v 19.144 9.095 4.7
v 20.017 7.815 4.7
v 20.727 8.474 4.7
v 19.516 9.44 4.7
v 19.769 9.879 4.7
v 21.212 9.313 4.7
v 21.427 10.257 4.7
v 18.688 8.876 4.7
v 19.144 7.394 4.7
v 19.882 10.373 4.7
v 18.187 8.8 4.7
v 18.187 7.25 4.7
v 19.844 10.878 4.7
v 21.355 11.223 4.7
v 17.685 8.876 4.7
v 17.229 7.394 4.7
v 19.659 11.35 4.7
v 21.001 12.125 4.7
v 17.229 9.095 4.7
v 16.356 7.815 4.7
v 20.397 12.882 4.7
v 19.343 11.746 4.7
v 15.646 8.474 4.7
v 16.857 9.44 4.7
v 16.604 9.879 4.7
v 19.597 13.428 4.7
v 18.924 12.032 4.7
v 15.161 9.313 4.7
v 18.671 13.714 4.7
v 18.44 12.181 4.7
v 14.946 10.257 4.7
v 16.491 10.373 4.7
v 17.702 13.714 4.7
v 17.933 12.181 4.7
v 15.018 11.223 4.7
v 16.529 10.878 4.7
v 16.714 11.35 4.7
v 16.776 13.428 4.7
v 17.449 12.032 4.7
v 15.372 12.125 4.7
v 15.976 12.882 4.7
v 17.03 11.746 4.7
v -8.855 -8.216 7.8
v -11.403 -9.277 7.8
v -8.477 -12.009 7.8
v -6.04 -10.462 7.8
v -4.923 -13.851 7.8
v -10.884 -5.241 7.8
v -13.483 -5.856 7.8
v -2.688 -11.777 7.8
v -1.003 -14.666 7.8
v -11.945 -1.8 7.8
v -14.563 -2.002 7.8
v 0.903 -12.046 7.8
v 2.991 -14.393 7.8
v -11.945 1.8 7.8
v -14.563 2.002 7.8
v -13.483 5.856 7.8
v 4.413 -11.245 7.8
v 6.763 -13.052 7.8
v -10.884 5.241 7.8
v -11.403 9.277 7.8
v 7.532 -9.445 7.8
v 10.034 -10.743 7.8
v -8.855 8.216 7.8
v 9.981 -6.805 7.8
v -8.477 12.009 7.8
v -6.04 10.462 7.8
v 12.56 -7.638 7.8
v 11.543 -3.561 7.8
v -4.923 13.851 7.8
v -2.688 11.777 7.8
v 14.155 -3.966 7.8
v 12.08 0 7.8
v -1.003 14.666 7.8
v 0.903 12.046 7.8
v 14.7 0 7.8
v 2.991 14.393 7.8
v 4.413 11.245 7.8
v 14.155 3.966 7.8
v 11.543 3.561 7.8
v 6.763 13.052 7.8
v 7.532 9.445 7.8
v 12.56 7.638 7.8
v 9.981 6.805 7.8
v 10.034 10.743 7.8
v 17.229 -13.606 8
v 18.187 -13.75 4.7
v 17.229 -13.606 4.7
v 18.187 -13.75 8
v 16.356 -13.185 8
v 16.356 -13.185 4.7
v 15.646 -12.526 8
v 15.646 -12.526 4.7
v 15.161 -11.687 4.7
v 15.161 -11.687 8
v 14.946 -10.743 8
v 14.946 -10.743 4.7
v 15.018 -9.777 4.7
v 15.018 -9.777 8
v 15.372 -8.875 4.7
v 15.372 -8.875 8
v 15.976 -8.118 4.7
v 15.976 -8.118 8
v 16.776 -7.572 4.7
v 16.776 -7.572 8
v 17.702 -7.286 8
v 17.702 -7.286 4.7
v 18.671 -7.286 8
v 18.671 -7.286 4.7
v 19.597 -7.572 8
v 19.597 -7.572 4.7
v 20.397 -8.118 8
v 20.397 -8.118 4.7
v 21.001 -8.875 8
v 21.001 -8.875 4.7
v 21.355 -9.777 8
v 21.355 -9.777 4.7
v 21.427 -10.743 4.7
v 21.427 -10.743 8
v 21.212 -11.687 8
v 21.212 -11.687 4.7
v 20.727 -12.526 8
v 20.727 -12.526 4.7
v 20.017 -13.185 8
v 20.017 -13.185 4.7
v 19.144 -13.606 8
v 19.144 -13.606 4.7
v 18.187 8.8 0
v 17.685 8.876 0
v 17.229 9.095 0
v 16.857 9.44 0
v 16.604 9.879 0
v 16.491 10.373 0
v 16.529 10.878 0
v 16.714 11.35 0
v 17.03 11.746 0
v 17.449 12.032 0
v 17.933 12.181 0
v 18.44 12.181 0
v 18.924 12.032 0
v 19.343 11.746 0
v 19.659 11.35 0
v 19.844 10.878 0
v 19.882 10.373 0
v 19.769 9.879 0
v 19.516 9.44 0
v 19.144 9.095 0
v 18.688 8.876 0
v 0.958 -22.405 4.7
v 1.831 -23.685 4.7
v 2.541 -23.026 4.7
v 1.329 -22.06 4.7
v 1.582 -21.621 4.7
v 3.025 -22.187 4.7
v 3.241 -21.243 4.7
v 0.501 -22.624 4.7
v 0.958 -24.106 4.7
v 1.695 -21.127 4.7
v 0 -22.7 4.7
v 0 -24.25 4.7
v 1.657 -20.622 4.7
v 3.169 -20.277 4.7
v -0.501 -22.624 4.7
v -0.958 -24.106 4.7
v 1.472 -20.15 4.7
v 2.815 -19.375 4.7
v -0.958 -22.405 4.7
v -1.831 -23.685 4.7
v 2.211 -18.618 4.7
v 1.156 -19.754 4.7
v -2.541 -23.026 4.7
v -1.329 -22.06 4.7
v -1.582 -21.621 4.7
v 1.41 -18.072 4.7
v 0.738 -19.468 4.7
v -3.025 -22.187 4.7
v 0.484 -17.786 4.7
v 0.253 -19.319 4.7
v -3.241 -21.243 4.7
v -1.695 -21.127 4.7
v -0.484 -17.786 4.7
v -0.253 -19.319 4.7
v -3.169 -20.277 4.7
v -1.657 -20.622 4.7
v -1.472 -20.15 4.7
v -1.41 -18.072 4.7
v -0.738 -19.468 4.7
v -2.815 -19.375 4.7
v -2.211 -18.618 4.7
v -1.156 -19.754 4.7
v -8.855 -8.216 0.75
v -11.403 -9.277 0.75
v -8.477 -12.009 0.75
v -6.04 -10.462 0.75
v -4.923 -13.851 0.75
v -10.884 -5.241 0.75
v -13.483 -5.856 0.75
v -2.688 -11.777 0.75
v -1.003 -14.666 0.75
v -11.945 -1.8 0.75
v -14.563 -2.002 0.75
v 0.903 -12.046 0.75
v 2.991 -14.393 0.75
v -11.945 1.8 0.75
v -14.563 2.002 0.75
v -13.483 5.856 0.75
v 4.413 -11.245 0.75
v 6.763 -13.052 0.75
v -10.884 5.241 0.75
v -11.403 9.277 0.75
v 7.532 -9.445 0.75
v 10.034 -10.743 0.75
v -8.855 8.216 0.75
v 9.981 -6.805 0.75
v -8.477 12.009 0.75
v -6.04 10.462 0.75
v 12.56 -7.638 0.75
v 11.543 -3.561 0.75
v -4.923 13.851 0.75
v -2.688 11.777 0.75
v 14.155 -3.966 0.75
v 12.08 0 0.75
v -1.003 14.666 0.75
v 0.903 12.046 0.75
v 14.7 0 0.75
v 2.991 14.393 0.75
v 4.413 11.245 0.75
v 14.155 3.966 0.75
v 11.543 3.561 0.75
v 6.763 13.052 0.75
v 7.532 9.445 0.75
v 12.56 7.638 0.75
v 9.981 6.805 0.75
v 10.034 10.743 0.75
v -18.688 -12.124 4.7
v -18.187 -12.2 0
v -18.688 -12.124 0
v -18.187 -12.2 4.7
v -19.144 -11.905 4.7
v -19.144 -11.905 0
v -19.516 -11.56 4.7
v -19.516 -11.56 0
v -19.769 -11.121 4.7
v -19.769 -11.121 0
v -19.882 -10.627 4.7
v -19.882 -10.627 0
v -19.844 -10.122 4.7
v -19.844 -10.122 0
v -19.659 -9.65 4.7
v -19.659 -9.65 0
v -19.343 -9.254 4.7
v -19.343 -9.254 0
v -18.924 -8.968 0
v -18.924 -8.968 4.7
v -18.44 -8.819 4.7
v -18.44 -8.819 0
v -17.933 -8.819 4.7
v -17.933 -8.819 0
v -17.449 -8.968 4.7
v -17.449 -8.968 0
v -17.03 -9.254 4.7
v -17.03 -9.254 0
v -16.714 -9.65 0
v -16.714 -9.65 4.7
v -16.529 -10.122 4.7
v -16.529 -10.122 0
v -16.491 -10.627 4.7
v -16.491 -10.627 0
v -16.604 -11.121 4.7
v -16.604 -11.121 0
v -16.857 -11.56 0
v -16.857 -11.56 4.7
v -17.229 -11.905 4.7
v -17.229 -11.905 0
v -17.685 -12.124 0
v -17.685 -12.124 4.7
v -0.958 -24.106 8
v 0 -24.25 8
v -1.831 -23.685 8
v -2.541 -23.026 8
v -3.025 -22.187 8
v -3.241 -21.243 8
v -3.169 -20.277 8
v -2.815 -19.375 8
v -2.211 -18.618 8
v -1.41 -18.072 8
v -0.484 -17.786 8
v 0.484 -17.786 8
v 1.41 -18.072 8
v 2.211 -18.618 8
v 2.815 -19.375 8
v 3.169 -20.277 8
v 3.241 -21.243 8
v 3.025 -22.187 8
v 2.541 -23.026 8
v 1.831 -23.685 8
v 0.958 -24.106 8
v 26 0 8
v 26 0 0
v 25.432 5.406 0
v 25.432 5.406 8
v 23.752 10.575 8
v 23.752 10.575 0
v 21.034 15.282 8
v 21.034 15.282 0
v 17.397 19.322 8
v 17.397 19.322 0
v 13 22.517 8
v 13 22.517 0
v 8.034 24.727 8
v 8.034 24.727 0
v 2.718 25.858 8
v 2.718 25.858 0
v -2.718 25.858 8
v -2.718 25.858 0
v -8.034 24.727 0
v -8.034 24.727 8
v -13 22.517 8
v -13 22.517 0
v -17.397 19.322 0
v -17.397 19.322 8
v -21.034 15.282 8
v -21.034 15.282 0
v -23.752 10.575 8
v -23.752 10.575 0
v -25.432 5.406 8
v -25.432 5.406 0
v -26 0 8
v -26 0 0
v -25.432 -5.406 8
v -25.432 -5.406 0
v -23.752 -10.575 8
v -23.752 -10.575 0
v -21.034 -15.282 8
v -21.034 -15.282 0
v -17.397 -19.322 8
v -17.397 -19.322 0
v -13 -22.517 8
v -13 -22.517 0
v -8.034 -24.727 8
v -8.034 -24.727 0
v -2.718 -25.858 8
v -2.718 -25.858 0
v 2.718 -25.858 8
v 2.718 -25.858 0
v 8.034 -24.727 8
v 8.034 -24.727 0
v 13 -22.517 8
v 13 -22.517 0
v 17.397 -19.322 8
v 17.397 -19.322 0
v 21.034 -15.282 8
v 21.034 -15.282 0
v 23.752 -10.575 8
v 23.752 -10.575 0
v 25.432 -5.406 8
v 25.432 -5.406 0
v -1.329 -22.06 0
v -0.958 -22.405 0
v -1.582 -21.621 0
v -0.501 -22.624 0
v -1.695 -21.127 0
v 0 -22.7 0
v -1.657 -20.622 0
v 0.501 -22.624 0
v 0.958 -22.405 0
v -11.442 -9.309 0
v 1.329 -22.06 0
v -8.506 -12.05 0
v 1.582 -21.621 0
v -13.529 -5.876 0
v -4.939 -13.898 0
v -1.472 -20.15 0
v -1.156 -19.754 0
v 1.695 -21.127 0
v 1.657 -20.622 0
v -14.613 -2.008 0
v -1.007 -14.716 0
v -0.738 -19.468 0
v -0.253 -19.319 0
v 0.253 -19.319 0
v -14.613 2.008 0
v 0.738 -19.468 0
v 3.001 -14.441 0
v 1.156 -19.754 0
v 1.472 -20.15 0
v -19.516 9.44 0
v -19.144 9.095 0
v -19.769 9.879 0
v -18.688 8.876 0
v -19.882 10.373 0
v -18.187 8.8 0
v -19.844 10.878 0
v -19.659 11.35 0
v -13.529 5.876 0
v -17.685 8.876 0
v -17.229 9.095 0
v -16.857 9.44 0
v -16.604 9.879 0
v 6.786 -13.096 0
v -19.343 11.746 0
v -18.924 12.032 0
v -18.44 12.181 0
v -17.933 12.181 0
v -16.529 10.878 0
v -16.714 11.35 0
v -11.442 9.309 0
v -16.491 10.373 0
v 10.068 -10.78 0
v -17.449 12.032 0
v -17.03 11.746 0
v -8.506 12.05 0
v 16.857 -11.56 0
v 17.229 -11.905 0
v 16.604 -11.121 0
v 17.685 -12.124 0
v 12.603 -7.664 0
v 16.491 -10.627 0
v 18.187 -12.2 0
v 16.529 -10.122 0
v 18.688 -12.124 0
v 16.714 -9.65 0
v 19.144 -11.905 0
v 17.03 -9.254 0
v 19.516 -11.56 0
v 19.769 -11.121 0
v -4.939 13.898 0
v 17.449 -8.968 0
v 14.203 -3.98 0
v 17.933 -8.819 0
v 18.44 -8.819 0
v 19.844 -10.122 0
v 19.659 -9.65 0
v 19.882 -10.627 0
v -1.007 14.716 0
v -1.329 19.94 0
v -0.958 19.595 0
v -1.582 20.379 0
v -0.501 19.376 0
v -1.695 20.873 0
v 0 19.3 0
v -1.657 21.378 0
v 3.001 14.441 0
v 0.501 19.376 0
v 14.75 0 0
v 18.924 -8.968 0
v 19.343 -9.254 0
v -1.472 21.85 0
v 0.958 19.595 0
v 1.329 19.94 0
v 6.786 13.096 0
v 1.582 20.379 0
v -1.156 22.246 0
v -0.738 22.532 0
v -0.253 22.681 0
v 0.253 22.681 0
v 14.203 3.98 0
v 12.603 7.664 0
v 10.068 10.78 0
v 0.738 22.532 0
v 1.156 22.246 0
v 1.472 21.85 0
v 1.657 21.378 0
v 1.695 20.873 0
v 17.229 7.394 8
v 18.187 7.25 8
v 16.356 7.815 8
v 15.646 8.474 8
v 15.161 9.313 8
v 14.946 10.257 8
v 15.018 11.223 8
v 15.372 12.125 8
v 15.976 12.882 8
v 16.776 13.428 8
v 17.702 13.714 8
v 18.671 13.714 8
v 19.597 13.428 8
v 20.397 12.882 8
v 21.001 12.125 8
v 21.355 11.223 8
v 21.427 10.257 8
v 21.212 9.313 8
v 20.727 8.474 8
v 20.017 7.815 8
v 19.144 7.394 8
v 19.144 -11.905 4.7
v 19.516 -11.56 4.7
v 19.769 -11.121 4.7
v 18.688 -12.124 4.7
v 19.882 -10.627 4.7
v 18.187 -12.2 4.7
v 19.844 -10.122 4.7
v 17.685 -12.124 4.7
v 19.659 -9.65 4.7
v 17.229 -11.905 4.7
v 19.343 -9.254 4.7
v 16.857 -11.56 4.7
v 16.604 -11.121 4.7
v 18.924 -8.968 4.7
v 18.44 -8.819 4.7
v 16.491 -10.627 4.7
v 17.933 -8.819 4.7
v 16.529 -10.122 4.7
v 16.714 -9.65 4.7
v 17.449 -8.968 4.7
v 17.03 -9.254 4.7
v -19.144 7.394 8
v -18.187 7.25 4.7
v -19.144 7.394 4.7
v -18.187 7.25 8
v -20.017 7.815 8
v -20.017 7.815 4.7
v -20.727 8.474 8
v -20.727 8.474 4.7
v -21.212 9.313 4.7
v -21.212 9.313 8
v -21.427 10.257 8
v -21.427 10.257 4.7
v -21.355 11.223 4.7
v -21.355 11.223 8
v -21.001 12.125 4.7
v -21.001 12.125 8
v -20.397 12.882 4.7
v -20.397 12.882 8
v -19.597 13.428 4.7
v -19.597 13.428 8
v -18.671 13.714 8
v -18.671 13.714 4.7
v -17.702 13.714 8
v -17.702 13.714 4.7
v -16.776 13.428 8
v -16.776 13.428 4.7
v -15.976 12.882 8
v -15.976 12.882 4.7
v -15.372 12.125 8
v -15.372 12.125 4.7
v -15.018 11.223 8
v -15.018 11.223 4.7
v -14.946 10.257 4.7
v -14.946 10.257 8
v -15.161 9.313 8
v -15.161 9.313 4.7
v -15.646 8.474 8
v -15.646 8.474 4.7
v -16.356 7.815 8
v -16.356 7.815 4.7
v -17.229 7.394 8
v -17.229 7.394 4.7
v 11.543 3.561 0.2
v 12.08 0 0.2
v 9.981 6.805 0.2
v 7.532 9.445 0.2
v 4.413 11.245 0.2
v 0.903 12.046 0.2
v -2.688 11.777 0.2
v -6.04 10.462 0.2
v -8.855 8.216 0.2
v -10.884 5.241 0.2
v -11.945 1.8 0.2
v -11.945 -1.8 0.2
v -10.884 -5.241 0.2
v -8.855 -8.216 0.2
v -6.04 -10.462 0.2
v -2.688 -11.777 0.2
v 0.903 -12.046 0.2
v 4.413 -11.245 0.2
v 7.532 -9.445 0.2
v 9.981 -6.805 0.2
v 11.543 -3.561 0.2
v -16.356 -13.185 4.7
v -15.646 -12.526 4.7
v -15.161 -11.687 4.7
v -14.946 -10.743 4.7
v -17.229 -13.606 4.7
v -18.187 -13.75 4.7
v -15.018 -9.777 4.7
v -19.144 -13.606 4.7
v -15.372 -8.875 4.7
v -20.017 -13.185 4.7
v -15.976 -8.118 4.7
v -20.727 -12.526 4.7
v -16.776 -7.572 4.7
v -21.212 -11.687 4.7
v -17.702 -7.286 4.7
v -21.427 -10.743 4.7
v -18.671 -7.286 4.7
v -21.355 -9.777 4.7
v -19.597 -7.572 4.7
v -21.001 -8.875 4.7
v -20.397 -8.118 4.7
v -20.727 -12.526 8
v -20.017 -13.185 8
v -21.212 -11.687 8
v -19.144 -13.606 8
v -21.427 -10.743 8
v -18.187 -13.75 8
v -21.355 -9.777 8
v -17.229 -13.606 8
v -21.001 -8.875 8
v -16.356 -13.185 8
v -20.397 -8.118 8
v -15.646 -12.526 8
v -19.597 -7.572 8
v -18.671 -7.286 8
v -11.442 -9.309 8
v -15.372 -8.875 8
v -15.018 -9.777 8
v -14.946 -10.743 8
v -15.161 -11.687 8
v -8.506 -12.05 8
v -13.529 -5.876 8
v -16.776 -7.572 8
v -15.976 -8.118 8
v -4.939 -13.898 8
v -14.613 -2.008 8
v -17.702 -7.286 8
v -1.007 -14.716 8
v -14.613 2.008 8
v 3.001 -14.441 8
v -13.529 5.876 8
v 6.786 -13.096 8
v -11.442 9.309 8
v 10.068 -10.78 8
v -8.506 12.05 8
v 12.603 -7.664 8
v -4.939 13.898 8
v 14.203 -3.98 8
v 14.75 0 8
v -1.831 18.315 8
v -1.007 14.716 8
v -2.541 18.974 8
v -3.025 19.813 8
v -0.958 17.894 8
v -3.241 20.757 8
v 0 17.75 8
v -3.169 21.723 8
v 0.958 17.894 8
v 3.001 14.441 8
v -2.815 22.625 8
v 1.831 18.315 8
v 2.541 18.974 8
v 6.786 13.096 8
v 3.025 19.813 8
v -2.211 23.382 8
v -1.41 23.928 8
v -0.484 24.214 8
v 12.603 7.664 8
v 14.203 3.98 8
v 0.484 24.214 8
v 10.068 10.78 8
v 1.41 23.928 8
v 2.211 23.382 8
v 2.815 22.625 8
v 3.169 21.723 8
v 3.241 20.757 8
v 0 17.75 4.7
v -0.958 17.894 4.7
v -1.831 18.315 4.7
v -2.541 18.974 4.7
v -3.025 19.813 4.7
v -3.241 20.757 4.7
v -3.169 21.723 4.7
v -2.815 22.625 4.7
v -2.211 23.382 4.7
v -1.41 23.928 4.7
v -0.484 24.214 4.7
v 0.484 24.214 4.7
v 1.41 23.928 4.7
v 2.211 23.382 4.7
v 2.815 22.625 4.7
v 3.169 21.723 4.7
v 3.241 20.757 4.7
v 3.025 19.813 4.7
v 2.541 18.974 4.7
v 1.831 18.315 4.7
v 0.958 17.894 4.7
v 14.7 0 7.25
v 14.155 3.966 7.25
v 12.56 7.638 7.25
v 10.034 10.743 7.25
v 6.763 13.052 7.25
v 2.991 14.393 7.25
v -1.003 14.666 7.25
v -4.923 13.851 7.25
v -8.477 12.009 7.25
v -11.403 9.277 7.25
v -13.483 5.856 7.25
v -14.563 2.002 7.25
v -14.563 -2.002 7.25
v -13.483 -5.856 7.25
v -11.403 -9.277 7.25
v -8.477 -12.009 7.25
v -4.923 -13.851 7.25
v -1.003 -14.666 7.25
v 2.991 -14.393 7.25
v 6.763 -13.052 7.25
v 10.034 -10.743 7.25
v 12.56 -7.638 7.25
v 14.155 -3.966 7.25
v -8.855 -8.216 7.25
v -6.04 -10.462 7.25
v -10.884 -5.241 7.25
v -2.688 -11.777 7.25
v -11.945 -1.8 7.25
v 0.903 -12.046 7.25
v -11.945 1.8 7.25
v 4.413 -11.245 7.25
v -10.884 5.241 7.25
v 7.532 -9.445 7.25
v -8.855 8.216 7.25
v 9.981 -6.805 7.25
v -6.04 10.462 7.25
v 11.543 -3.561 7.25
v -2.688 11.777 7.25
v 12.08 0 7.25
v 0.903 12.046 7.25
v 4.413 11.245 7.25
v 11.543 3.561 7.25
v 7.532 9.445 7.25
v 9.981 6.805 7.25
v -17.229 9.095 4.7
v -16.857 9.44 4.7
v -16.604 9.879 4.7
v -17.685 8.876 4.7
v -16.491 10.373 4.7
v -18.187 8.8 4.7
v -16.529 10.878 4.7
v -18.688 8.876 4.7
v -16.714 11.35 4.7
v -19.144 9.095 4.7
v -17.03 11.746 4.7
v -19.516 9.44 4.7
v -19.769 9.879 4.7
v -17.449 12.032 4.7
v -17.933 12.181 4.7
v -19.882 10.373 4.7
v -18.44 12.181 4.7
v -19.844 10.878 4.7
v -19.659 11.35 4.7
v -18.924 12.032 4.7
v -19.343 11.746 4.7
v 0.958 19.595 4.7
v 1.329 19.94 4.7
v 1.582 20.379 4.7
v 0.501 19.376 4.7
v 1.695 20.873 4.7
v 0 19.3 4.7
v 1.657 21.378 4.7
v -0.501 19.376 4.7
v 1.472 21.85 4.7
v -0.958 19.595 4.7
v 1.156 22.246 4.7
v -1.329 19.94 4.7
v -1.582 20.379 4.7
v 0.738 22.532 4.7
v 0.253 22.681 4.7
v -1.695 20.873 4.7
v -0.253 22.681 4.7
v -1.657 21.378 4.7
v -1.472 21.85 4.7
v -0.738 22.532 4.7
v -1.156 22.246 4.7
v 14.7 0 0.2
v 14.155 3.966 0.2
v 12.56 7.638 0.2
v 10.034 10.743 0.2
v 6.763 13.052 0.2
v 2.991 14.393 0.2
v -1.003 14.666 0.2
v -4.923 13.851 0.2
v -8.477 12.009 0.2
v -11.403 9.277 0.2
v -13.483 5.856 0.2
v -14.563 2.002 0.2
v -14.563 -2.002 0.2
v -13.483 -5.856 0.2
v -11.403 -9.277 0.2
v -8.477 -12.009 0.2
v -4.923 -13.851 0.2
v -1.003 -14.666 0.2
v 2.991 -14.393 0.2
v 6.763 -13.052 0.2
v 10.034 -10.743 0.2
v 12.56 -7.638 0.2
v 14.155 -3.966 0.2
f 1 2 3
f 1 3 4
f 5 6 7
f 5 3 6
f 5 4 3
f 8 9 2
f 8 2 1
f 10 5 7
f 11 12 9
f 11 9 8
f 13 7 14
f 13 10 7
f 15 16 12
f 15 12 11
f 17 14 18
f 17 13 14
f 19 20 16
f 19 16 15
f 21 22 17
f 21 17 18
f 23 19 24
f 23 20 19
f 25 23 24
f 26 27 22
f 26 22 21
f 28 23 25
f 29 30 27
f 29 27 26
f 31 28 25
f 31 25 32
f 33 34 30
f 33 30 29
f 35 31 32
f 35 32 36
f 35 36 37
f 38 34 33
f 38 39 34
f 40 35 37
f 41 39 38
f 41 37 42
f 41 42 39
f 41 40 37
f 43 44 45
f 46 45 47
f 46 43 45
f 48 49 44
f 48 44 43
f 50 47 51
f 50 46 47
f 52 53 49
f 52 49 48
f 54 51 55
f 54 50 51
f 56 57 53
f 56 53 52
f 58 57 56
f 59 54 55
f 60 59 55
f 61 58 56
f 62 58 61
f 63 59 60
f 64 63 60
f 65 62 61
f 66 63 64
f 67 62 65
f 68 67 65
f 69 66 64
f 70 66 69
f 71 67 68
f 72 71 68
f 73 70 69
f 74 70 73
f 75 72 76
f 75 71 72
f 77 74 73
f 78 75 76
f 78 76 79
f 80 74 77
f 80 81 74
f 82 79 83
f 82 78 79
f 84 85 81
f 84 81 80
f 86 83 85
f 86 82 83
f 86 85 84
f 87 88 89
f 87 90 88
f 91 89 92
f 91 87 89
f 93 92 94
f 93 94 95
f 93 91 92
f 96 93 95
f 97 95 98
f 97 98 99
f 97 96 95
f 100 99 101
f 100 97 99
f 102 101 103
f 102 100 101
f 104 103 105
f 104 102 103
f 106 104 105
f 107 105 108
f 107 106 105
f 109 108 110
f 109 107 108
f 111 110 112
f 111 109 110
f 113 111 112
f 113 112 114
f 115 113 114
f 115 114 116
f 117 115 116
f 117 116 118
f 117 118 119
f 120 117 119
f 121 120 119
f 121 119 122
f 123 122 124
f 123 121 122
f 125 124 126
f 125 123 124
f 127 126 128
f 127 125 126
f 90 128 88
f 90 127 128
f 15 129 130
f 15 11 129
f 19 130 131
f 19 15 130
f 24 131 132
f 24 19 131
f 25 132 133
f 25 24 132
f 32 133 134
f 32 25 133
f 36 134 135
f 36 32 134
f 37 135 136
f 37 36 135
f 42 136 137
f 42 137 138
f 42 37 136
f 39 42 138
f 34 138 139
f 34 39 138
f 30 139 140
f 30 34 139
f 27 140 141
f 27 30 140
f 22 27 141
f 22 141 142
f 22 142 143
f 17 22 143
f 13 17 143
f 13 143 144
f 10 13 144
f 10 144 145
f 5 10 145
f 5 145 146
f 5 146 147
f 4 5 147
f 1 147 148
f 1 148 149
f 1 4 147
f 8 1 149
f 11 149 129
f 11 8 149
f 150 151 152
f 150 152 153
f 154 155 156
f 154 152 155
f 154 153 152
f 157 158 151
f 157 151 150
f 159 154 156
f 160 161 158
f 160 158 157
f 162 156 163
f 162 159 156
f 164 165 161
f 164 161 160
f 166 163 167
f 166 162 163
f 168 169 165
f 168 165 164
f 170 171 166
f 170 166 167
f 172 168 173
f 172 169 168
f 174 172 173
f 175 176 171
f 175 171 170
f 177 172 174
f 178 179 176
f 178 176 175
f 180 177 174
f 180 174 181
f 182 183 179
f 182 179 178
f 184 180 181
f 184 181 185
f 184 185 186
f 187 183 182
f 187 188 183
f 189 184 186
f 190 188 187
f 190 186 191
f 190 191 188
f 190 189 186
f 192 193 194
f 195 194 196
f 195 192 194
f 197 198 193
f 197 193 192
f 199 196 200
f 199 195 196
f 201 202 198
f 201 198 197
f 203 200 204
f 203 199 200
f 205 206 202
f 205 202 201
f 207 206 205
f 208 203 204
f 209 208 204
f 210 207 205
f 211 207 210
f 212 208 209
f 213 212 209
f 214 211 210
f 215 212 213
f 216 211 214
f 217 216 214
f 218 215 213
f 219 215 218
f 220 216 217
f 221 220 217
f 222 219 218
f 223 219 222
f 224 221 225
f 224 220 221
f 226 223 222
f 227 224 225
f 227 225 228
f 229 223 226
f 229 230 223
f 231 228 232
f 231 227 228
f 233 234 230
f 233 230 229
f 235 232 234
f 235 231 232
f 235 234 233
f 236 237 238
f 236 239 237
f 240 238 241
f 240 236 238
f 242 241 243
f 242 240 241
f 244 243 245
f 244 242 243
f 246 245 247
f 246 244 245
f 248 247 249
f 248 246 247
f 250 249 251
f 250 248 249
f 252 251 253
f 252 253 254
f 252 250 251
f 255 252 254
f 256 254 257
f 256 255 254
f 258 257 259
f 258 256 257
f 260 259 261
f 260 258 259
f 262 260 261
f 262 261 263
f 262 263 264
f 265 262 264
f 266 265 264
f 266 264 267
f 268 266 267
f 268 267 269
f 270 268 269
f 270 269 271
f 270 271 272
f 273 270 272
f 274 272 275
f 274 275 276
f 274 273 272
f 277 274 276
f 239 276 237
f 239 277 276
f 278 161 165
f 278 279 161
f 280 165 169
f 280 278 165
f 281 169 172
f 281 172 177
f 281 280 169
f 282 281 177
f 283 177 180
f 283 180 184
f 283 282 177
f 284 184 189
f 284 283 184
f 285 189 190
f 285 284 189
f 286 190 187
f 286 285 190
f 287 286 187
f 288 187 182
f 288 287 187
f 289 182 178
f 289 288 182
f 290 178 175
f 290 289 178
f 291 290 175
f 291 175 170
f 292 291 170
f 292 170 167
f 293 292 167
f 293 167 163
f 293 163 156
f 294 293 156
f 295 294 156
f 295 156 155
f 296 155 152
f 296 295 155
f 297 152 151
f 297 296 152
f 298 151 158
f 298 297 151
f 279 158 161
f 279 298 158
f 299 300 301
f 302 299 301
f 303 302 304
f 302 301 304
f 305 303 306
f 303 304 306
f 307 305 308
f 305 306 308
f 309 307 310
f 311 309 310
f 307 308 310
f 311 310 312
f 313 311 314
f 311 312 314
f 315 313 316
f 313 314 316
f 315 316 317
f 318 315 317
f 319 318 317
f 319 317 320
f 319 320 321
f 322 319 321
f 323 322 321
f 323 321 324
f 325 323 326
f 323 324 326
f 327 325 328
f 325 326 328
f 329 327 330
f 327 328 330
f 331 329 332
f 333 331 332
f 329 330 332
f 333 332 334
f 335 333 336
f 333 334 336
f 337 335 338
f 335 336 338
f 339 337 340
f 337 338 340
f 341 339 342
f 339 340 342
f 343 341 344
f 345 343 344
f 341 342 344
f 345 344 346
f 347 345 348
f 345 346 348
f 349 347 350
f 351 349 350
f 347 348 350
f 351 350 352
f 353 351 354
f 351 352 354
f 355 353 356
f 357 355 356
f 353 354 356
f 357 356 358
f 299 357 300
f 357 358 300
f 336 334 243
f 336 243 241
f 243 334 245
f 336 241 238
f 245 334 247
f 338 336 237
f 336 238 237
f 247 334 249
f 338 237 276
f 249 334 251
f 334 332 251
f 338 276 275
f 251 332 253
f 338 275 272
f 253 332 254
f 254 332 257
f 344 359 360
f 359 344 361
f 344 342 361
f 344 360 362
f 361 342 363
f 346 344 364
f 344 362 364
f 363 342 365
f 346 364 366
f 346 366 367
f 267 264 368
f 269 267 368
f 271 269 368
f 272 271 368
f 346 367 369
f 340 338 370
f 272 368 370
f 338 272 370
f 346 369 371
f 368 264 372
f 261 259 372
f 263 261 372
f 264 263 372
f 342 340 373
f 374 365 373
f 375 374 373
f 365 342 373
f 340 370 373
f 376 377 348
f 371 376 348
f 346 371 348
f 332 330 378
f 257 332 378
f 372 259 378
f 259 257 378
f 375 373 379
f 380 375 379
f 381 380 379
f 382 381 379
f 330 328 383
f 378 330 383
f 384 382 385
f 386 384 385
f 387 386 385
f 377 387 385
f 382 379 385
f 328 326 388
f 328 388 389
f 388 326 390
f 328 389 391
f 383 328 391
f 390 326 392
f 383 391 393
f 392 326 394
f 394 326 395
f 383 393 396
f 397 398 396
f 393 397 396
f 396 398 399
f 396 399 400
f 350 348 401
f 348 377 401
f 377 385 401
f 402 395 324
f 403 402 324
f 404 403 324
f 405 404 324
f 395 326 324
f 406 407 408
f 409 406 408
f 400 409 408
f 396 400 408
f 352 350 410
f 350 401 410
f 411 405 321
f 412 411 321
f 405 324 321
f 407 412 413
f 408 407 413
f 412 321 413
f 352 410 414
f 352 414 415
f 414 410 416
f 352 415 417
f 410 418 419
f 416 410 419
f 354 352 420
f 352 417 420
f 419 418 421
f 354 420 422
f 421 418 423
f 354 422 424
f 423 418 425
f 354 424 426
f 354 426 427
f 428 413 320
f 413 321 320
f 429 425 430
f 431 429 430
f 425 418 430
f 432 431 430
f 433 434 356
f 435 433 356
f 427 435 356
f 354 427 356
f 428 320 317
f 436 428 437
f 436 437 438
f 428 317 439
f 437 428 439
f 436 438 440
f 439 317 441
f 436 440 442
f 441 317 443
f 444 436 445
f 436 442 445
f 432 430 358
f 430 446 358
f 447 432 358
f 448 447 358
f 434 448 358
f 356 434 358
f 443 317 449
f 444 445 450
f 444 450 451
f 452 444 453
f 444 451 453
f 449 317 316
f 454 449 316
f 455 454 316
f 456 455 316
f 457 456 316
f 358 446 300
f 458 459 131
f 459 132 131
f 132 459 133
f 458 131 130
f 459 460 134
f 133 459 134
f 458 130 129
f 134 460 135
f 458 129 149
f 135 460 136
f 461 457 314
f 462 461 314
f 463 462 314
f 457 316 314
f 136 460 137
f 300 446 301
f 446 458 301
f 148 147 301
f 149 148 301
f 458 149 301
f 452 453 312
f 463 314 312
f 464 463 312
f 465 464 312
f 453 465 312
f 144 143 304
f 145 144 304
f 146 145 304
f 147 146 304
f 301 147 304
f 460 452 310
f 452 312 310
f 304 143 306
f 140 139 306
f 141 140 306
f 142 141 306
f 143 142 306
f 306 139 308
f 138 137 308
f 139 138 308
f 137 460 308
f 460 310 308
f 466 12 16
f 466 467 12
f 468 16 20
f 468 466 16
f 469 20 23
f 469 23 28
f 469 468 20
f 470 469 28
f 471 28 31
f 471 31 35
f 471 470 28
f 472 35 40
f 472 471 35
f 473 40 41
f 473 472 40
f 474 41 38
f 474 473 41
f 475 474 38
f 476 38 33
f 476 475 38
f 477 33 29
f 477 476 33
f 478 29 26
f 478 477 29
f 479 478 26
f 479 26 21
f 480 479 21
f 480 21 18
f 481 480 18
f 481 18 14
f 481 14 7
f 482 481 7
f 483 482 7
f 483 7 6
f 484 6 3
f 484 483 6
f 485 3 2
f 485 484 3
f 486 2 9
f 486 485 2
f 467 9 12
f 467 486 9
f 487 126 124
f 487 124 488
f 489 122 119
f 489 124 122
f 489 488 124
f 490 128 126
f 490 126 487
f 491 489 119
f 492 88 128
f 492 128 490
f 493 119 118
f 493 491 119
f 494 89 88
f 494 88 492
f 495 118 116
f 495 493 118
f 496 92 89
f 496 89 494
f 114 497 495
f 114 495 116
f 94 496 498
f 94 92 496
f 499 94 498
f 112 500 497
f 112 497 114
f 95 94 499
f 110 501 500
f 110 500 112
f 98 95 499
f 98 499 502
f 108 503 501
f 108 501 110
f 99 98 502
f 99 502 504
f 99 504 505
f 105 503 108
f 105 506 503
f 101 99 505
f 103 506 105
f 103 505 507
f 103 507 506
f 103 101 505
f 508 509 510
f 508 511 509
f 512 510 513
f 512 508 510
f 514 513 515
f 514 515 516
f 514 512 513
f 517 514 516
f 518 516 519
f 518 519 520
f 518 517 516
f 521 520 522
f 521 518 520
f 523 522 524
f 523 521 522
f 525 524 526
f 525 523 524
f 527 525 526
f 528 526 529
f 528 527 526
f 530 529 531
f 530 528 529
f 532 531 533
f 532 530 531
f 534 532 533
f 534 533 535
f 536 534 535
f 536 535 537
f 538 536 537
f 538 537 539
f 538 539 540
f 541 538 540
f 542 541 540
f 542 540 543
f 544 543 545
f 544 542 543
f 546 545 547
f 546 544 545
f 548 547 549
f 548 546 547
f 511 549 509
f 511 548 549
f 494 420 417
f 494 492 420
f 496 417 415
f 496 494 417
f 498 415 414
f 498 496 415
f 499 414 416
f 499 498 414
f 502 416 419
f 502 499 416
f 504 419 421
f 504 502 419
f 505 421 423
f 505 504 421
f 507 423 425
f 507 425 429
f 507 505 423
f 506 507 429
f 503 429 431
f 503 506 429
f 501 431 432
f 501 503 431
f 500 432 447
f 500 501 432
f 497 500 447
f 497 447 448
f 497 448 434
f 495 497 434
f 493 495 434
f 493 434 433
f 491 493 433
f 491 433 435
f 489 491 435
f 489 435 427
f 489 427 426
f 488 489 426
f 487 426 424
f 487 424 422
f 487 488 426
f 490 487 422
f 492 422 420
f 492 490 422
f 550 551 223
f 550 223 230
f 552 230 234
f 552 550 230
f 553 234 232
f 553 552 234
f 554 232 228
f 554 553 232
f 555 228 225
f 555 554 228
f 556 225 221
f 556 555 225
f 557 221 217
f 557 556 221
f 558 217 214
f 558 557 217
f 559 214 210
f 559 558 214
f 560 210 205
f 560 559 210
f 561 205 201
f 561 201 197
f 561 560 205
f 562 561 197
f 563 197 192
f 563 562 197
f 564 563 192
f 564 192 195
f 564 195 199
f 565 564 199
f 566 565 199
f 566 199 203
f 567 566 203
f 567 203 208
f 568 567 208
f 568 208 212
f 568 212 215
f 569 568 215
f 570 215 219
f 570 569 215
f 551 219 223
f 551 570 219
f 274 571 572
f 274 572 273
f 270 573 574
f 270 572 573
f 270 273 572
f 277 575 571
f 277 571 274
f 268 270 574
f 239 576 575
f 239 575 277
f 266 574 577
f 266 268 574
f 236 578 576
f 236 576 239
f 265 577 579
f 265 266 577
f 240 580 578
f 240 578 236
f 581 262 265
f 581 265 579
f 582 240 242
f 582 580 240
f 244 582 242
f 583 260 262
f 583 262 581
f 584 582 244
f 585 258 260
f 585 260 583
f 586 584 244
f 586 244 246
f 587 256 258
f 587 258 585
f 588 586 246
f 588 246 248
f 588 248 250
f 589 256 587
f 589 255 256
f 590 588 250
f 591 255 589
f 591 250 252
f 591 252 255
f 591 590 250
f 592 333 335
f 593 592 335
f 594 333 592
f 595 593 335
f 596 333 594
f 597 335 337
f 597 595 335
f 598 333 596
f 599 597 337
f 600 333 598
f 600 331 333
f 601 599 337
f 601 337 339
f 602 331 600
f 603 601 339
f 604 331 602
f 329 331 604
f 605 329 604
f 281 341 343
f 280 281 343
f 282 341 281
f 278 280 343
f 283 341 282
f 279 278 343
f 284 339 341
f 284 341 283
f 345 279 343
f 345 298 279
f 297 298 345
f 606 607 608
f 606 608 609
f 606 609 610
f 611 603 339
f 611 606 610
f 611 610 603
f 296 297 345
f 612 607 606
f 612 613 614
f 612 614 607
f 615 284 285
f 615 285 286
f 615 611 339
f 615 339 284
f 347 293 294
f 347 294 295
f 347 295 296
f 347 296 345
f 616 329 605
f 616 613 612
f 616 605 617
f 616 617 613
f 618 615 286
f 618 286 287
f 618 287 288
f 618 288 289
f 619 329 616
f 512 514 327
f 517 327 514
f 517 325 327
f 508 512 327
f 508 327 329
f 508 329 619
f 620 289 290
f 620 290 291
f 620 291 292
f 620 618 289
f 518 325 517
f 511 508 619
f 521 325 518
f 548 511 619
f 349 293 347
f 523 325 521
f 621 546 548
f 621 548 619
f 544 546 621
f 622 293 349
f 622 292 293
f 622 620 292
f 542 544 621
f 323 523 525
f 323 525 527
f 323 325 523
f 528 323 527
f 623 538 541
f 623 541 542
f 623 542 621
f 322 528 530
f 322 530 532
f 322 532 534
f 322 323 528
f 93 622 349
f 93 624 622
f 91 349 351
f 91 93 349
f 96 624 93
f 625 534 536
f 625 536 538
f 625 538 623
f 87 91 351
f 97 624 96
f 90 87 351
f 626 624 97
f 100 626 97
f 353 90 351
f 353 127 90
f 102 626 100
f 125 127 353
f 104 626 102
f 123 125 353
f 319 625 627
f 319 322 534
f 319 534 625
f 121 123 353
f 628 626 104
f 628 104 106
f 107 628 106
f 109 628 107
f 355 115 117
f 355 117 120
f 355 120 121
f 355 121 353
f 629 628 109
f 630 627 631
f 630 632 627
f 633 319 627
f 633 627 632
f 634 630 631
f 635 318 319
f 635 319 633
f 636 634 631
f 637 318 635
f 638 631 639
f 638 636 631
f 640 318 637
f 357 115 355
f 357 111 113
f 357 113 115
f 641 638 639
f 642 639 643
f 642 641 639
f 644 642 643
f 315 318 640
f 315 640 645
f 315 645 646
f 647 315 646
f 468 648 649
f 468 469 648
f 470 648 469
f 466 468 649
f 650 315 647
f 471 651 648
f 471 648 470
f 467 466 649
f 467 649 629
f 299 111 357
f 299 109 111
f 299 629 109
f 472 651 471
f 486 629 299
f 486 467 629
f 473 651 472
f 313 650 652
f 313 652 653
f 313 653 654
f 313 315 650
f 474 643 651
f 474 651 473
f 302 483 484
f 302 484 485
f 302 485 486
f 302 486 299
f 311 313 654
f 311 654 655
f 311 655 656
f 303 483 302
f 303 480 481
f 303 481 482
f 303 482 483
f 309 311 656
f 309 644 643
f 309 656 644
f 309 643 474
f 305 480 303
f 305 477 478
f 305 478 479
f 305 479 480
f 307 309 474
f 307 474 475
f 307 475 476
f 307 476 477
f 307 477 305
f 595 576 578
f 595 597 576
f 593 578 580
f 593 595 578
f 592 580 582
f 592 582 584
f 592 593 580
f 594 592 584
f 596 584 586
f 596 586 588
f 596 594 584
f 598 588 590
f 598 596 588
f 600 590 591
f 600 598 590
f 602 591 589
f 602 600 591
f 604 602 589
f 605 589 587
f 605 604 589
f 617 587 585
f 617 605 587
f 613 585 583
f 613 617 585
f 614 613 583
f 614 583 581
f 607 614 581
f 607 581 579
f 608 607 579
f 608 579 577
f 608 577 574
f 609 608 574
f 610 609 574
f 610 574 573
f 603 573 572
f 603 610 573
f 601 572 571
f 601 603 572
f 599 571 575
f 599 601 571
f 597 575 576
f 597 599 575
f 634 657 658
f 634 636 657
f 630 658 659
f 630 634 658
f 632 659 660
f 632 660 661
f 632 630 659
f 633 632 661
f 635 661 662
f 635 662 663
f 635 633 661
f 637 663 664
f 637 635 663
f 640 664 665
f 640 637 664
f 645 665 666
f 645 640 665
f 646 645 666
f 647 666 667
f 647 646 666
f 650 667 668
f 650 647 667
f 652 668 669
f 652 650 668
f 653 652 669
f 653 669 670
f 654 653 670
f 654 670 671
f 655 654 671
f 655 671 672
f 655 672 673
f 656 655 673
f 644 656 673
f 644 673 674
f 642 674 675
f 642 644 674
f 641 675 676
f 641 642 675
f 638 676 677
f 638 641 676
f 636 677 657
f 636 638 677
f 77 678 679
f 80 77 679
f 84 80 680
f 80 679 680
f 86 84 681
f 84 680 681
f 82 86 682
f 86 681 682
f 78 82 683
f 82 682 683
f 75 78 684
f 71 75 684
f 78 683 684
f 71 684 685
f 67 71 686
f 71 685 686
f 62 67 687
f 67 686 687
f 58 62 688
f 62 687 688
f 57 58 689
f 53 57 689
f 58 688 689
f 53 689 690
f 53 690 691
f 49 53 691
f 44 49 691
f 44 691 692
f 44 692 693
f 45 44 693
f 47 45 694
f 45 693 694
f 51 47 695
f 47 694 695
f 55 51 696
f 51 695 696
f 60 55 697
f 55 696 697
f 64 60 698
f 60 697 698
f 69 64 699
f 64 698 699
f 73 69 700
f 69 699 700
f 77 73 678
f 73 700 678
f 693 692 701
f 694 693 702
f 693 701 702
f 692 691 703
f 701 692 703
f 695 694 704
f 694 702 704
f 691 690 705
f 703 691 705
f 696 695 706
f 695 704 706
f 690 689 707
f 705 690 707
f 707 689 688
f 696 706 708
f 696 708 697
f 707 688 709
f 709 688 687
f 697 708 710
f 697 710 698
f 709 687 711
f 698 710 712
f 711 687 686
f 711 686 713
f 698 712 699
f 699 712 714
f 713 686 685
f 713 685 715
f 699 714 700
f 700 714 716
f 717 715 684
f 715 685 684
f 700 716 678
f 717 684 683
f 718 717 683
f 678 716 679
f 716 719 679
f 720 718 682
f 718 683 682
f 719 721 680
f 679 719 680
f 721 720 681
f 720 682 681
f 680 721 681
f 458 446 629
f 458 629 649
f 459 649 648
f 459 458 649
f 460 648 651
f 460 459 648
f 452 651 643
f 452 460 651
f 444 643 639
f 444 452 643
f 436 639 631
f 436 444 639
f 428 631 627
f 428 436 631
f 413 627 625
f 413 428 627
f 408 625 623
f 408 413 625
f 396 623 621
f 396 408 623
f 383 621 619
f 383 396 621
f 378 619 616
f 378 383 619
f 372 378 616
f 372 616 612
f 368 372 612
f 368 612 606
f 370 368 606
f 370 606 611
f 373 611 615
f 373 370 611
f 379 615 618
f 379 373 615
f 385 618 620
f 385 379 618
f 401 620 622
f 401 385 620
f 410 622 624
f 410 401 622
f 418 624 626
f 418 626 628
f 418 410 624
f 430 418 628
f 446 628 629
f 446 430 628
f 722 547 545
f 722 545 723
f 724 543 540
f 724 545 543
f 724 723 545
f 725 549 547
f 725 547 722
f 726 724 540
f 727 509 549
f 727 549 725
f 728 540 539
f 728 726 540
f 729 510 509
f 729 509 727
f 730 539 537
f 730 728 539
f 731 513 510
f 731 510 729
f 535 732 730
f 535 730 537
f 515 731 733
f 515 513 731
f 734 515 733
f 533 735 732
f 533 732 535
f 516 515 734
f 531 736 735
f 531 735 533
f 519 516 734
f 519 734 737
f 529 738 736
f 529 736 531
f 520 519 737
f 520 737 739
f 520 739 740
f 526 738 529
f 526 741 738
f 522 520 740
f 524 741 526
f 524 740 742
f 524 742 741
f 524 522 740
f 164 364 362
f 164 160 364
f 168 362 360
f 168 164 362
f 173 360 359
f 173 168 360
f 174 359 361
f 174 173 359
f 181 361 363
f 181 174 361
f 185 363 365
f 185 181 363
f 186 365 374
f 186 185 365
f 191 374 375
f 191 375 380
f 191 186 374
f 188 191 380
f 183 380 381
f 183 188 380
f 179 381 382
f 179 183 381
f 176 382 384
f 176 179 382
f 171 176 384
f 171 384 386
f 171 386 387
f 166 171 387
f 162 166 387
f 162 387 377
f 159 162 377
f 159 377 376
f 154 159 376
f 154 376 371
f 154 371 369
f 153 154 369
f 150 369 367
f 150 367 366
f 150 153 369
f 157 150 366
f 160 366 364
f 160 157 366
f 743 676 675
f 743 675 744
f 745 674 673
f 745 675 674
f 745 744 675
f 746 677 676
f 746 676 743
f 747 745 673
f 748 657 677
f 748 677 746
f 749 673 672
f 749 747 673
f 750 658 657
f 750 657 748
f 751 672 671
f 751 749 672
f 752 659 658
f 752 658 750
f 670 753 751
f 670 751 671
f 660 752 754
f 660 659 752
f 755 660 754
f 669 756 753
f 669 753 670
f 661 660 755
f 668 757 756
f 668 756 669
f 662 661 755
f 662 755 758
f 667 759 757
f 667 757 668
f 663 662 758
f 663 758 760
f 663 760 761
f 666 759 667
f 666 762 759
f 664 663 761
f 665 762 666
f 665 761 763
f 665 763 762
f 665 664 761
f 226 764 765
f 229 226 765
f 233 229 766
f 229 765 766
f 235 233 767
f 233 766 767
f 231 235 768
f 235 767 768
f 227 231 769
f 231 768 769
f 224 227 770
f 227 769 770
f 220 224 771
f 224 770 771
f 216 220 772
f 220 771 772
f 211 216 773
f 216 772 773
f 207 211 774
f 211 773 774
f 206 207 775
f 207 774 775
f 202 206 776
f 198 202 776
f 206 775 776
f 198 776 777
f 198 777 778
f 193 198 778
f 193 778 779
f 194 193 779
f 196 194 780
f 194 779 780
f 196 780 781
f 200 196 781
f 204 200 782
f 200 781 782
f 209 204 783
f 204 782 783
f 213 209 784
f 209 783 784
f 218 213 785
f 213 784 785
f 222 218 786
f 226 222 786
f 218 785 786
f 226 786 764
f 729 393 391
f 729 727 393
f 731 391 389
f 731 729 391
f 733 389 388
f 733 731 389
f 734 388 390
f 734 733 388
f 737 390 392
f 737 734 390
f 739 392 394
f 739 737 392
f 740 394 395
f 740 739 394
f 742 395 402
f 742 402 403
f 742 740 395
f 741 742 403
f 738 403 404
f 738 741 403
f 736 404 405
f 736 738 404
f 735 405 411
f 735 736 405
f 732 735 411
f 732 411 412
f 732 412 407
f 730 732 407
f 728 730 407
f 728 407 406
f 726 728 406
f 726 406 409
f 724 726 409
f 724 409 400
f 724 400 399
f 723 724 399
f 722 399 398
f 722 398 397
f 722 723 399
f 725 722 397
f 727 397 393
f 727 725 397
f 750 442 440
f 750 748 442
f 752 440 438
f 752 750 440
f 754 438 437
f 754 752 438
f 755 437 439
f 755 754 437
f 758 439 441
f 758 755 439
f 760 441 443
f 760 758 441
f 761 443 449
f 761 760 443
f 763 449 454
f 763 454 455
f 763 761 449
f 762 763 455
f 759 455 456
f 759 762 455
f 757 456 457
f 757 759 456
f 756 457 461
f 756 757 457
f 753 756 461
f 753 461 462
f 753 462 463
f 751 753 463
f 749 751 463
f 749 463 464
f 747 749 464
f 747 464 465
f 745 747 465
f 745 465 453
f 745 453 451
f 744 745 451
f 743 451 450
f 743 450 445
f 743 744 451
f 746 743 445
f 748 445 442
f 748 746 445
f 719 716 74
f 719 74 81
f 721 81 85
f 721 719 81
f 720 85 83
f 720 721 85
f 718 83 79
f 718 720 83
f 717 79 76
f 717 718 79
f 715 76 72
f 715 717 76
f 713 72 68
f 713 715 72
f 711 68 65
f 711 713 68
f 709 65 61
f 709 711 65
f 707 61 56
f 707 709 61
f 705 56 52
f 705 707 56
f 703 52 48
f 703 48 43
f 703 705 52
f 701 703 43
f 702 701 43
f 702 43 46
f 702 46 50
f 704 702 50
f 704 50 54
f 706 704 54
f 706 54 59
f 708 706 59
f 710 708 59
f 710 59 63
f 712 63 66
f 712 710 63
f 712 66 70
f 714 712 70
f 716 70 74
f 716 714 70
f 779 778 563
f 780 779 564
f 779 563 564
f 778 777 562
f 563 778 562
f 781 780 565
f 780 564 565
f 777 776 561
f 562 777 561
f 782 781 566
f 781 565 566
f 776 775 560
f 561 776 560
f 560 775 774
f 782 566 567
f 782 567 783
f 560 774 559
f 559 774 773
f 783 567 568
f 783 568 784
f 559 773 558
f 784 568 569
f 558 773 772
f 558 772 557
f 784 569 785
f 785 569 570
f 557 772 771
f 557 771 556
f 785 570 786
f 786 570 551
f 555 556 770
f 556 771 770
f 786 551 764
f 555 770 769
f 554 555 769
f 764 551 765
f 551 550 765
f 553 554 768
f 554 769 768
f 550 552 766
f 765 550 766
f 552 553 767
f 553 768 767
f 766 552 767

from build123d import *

# Parameters (mm, degrees)
D52_D29_5_8_2_R                    = 26
D52_D29_5_8_2_R_2                  = 14.75
D52_D29_5_8_DEPTH                  = 8
D10_D24_8_2_R                      = 12
D10_D24_8_2_R_2                    = 5
D10_D24_8_DEPTH                    = 8
F_6XD3_4_D6_5_3_3_PCD42_AT_2_COUNT = 2
F_6XD3_4_D6_5_3_3_PCD42_AT_2_PITCH = 21
F_6XD3_4_D6_5_3_3_PCD42_AT_3_COUNT = 2
F_6XD3_4_D6_5_3_3_PCD42_AT_3_PITCH = 36.373066959
F_6XD3_4_D6_5_3_3_PCD42_AT_4_COUNT = 2
F_6XD3_4_D6_5_3_3_PCD42_AT_4_PITCH = 42
F_6XD3_4_D6_5_3_3_PCD42_AT_5_COUNT = 2
F_6XD3_4_D6_5_3_3_PCD42_AT_5_PITCH = 36.373066959
F_6XD3_4_D6_5_3_3_PCD42_AT_6_COUNT = 2
F_6XD3_4_D6_5_3_3_PCD42_AT_6_PITCH = 21
SKETCH_6_W                         = 1.25
SKETCH_6_H                         = 8
F_4XM3X0_5_PCD16_AT_2_COUNT        = 2
F_4XM3X0_5_PCD16_AT_2_PITCH        = 11.313708499
F_4XM3X0_5_PCD16_AT_3_COUNT        = 2
F_4XM3X0_5_PCD16_AT_3_PITCH        = 16
F_4XM3X0_5_PCD16_AT_4_COUNT        = 2
F_4XM3X0_5_PCD16_AT_4_PITCH        = 11.313708499
EXTRUDE_START                      = 7.25
SKETCH_2032_R                      = 14.7
SKETCH_2032_R_2                    = 12.08
EXTRUDE_2043_DEPTH                 = 0.55
EXTRUDE_START_2                    = 0.2
SKETCH_2080_R                      = 14.7
SKETCH_2080_R_2                    = 12.08
EXTRUDE_2091_DEPTH                 = 0.55


with BuildPart() as part:
    # D52__D29.5__8 2 → D52__D29.5__8 (new body)
    with BuildSketch(Plane.XY):
        Circle(D52_D29_5_8_2_R)
        Circle(D52_D29_5_8_2_R_2, mode=Mode.SUBTRACT)
    extrude(amount=D52_D29_5_8_DEPTH)

    # 草图4 → 外圈_6xD3.4通孔_D6.5沉孔深3.3_PCD42 (revolve, cut)
    with BuildSketch(Plane(origin=(18.186533479, 10.5, 8), x_dir=(0, -1, 0), z_dir=(1, 0, 0))):
        Polygon((0, 0), (0, 8), (1.7, 8), (1.7, 3.3), (3.25, 3.3), (3.25, 0), align=None)
    f_6xd3_4_d6_5_3_3_pcd42 = revolve(axis=Axis((18.186533479, 10.5, 14.35), (0, 0, -1)), mode=Mode.SUBTRACT)

    # 外圈_6xD3.4通孔_D6.5沉孔深3.3_PCD42 at 2: 外圈_6xD3.4通孔_D6.5沉孔深3.3_PCD42 ×2
    with Locations(*[(0, -i * F_6XD3_4_D6_5_3_3_PCD42_AT_2_PITCH, 0) for i in range(1, F_6XD3_4_D6_5_3_3_PCD42_AT_2_COUNT)]):
        add(f_6xd3_4_d6_5_3_3_pcd42, mode=Mode.SUBTRACT)

    # 外圈_6xD3.4通孔_D6.5沉孔深3.3_PCD42 at 3: 外圈_6xD3.4通孔_D6.5沉孔深3.3_PCD42 ×2
    with Locations(*[Vector(-0.5000000000000001, -0.8660254037844386, 0) * (i * F_6XD3_4_D6_5_3_3_PCD42_AT_3_PITCH) for i in range(1, F_6XD3_4_D6_5_3_3_PCD42_AT_3_COUNT)]):
        add(f_6xd3_4_d6_5_3_3_pcd42, mode=Mode.SUBTRACT)

    # 外圈_6xD3.4通孔_D6.5沉孔深3.3_PCD42 at 4: 外圈_6xD3.4通孔_D6.5沉孔深3.3_PCD42 ×2
    with Locations(*[Vector(-0.8660254037844387, -0.49999999999999983, 0) * (i * F_6XD3_4_D6_5_3_3_PCD42_AT_4_PITCH) for i in range(1, F_6XD3_4_D6_5_3_3_PCD42_AT_4_COUNT)]):
        add(f_6xd3_4_d6_5_3_3_pcd42, mode=Mode.SUBTRACT)

    # 外圈_6xD3.4通孔_D6.5沉孔深3.3_PCD42 at 5: 外圈_6xD3.4通孔_D6.5沉孔深3.3_PCD42 ×2
    with Locations(*[(-i * F_6XD3_4_D6_5_3_3_PCD42_AT_5_PITCH, 0, 0) for i in range(1, F_6XD3_4_D6_5_3_3_PCD42_AT_5_COUNT)]):
        add(f_6xd3_4_d6_5_3_3_pcd42, mode=Mode.SUBTRACT)

    # 外圈_6xD3.4通孔_D6.5沉孔深3.3_PCD42 at 6: 外圈_6xD3.4通孔_D6.5沉孔深3.3_PCD42 ×2
    with Locations(*[Vector(-0.8660254037844387, 0.5, 0) * (i * F_6XD3_4_D6_5_3_3_PCD42_AT_6_PITCH) for i in range(1, F_6XD3_4_D6_5_3_3_PCD42_AT_6_COUNT)]):
        add(f_6xd3_4_d6_5_3_3_pcd42, mode=Mode.SUBTRACT)


with BuildPart() as body_2:
    # D10__D24__8 2 → D10__D24__8 (new body)
    with BuildSketch(Plane.XY):
        Circle(D10_D24_8_2_R)
        Circle(D10_D24_8_2_R_2, mode=Mode.SUBTRACT)
    extrude(amount=D10_D24_8_DEPTH)

    # 草图6 → 内圈_4xM3x0.5通螺纹_PCD16 (revolve, cut)
    with BuildSketch(Plane(origin=(5.656854249, -5.656854249, 8), x_dir=(0, -1, 0), z_dir=(1, 0, 0))):
        with Locations((0.625, 4)):
            Rectangle(SKETCH_6_W, SKETCH_6_H)
    f_4xm3x0_5_pcd16 = revolve(axis=Axis((5.656854249, -5.656854249, 14.35), (0, 0, -1)), mode=Mode.SUBTRACT)

    # 内圈_4xM3x0.5通螺纹_PCD16 at 2: 内圈_4xM3x0.5通螺纹_PCD16 ×2
    with Locations(*[(-i * F_4XM3X0_5_PCD16_AT_2_PITCH, 0, 0) for i in range(1, F_4XM3X0_5_PCD16_AT_2_COUNT)]):
        add(f_4xm3x0_5_pcd16, mode=Mode.SUBTRACT)

    # 内圈_4xM3x0.5通螺纹_PCD16 at 3: 内圈_4xM3x0.5通螺纹_PCD16 ×2
    with Locations(*[Vector(-0.7071067811865475, 0.7071067811865477, 0) * (i * F_4XM3X0_5_PCD16_AT_3_PITCH) for i in range(1, F_4XM3X0_5_PCD16_AT_3_COUNT)]):
        add(f_4xm3x0_5_pcd16, mode=Mode.SUBTRACT)

    # 内圈_4xM3x0.5通螺纹_PCD16 at 4: 内圈_4xM3x0.5通螺纹_PCD16 ×2
    with Locations(*[(0, i * F_4XM3X0_5_PCD16_AT_4_PITCH, 0) for i in range(1, F_4XM3X0_5_PCD16_AT_4_COUNT)]):
        add(f_4xm3x0_5_pcd16, mode=Mode.SUBTRACT)


with BuildPart() as body_3:
    # Sketch 2032 → Extrude 2043 (new body)
    with BuildSketch(Plane.XY.offset(EXTRUDE_START)):
        Circle(SKETCH_2032_R)
        Circle(SKETCH_2032_R_2, mode=Mode.SUBTRACT)
    extrude(amount=EXTRUDE_2043_DEPTH)


with BuildPart() as body_4:
    # Sketch 2080 → Extrude 2091 (new body)
    with BuildSketch(Plane.XY.offset(EXTRUDE_START_2)):
        Circle(SKETCH_2080_R)
        Circle(SKETCH_2080_R_2, mode=Mode.SUBTRACT)
    extrude(amount=EXTRUDE_2091_DEPTH)


solid = Compound([part.part, body_3.part, body_4.part])
